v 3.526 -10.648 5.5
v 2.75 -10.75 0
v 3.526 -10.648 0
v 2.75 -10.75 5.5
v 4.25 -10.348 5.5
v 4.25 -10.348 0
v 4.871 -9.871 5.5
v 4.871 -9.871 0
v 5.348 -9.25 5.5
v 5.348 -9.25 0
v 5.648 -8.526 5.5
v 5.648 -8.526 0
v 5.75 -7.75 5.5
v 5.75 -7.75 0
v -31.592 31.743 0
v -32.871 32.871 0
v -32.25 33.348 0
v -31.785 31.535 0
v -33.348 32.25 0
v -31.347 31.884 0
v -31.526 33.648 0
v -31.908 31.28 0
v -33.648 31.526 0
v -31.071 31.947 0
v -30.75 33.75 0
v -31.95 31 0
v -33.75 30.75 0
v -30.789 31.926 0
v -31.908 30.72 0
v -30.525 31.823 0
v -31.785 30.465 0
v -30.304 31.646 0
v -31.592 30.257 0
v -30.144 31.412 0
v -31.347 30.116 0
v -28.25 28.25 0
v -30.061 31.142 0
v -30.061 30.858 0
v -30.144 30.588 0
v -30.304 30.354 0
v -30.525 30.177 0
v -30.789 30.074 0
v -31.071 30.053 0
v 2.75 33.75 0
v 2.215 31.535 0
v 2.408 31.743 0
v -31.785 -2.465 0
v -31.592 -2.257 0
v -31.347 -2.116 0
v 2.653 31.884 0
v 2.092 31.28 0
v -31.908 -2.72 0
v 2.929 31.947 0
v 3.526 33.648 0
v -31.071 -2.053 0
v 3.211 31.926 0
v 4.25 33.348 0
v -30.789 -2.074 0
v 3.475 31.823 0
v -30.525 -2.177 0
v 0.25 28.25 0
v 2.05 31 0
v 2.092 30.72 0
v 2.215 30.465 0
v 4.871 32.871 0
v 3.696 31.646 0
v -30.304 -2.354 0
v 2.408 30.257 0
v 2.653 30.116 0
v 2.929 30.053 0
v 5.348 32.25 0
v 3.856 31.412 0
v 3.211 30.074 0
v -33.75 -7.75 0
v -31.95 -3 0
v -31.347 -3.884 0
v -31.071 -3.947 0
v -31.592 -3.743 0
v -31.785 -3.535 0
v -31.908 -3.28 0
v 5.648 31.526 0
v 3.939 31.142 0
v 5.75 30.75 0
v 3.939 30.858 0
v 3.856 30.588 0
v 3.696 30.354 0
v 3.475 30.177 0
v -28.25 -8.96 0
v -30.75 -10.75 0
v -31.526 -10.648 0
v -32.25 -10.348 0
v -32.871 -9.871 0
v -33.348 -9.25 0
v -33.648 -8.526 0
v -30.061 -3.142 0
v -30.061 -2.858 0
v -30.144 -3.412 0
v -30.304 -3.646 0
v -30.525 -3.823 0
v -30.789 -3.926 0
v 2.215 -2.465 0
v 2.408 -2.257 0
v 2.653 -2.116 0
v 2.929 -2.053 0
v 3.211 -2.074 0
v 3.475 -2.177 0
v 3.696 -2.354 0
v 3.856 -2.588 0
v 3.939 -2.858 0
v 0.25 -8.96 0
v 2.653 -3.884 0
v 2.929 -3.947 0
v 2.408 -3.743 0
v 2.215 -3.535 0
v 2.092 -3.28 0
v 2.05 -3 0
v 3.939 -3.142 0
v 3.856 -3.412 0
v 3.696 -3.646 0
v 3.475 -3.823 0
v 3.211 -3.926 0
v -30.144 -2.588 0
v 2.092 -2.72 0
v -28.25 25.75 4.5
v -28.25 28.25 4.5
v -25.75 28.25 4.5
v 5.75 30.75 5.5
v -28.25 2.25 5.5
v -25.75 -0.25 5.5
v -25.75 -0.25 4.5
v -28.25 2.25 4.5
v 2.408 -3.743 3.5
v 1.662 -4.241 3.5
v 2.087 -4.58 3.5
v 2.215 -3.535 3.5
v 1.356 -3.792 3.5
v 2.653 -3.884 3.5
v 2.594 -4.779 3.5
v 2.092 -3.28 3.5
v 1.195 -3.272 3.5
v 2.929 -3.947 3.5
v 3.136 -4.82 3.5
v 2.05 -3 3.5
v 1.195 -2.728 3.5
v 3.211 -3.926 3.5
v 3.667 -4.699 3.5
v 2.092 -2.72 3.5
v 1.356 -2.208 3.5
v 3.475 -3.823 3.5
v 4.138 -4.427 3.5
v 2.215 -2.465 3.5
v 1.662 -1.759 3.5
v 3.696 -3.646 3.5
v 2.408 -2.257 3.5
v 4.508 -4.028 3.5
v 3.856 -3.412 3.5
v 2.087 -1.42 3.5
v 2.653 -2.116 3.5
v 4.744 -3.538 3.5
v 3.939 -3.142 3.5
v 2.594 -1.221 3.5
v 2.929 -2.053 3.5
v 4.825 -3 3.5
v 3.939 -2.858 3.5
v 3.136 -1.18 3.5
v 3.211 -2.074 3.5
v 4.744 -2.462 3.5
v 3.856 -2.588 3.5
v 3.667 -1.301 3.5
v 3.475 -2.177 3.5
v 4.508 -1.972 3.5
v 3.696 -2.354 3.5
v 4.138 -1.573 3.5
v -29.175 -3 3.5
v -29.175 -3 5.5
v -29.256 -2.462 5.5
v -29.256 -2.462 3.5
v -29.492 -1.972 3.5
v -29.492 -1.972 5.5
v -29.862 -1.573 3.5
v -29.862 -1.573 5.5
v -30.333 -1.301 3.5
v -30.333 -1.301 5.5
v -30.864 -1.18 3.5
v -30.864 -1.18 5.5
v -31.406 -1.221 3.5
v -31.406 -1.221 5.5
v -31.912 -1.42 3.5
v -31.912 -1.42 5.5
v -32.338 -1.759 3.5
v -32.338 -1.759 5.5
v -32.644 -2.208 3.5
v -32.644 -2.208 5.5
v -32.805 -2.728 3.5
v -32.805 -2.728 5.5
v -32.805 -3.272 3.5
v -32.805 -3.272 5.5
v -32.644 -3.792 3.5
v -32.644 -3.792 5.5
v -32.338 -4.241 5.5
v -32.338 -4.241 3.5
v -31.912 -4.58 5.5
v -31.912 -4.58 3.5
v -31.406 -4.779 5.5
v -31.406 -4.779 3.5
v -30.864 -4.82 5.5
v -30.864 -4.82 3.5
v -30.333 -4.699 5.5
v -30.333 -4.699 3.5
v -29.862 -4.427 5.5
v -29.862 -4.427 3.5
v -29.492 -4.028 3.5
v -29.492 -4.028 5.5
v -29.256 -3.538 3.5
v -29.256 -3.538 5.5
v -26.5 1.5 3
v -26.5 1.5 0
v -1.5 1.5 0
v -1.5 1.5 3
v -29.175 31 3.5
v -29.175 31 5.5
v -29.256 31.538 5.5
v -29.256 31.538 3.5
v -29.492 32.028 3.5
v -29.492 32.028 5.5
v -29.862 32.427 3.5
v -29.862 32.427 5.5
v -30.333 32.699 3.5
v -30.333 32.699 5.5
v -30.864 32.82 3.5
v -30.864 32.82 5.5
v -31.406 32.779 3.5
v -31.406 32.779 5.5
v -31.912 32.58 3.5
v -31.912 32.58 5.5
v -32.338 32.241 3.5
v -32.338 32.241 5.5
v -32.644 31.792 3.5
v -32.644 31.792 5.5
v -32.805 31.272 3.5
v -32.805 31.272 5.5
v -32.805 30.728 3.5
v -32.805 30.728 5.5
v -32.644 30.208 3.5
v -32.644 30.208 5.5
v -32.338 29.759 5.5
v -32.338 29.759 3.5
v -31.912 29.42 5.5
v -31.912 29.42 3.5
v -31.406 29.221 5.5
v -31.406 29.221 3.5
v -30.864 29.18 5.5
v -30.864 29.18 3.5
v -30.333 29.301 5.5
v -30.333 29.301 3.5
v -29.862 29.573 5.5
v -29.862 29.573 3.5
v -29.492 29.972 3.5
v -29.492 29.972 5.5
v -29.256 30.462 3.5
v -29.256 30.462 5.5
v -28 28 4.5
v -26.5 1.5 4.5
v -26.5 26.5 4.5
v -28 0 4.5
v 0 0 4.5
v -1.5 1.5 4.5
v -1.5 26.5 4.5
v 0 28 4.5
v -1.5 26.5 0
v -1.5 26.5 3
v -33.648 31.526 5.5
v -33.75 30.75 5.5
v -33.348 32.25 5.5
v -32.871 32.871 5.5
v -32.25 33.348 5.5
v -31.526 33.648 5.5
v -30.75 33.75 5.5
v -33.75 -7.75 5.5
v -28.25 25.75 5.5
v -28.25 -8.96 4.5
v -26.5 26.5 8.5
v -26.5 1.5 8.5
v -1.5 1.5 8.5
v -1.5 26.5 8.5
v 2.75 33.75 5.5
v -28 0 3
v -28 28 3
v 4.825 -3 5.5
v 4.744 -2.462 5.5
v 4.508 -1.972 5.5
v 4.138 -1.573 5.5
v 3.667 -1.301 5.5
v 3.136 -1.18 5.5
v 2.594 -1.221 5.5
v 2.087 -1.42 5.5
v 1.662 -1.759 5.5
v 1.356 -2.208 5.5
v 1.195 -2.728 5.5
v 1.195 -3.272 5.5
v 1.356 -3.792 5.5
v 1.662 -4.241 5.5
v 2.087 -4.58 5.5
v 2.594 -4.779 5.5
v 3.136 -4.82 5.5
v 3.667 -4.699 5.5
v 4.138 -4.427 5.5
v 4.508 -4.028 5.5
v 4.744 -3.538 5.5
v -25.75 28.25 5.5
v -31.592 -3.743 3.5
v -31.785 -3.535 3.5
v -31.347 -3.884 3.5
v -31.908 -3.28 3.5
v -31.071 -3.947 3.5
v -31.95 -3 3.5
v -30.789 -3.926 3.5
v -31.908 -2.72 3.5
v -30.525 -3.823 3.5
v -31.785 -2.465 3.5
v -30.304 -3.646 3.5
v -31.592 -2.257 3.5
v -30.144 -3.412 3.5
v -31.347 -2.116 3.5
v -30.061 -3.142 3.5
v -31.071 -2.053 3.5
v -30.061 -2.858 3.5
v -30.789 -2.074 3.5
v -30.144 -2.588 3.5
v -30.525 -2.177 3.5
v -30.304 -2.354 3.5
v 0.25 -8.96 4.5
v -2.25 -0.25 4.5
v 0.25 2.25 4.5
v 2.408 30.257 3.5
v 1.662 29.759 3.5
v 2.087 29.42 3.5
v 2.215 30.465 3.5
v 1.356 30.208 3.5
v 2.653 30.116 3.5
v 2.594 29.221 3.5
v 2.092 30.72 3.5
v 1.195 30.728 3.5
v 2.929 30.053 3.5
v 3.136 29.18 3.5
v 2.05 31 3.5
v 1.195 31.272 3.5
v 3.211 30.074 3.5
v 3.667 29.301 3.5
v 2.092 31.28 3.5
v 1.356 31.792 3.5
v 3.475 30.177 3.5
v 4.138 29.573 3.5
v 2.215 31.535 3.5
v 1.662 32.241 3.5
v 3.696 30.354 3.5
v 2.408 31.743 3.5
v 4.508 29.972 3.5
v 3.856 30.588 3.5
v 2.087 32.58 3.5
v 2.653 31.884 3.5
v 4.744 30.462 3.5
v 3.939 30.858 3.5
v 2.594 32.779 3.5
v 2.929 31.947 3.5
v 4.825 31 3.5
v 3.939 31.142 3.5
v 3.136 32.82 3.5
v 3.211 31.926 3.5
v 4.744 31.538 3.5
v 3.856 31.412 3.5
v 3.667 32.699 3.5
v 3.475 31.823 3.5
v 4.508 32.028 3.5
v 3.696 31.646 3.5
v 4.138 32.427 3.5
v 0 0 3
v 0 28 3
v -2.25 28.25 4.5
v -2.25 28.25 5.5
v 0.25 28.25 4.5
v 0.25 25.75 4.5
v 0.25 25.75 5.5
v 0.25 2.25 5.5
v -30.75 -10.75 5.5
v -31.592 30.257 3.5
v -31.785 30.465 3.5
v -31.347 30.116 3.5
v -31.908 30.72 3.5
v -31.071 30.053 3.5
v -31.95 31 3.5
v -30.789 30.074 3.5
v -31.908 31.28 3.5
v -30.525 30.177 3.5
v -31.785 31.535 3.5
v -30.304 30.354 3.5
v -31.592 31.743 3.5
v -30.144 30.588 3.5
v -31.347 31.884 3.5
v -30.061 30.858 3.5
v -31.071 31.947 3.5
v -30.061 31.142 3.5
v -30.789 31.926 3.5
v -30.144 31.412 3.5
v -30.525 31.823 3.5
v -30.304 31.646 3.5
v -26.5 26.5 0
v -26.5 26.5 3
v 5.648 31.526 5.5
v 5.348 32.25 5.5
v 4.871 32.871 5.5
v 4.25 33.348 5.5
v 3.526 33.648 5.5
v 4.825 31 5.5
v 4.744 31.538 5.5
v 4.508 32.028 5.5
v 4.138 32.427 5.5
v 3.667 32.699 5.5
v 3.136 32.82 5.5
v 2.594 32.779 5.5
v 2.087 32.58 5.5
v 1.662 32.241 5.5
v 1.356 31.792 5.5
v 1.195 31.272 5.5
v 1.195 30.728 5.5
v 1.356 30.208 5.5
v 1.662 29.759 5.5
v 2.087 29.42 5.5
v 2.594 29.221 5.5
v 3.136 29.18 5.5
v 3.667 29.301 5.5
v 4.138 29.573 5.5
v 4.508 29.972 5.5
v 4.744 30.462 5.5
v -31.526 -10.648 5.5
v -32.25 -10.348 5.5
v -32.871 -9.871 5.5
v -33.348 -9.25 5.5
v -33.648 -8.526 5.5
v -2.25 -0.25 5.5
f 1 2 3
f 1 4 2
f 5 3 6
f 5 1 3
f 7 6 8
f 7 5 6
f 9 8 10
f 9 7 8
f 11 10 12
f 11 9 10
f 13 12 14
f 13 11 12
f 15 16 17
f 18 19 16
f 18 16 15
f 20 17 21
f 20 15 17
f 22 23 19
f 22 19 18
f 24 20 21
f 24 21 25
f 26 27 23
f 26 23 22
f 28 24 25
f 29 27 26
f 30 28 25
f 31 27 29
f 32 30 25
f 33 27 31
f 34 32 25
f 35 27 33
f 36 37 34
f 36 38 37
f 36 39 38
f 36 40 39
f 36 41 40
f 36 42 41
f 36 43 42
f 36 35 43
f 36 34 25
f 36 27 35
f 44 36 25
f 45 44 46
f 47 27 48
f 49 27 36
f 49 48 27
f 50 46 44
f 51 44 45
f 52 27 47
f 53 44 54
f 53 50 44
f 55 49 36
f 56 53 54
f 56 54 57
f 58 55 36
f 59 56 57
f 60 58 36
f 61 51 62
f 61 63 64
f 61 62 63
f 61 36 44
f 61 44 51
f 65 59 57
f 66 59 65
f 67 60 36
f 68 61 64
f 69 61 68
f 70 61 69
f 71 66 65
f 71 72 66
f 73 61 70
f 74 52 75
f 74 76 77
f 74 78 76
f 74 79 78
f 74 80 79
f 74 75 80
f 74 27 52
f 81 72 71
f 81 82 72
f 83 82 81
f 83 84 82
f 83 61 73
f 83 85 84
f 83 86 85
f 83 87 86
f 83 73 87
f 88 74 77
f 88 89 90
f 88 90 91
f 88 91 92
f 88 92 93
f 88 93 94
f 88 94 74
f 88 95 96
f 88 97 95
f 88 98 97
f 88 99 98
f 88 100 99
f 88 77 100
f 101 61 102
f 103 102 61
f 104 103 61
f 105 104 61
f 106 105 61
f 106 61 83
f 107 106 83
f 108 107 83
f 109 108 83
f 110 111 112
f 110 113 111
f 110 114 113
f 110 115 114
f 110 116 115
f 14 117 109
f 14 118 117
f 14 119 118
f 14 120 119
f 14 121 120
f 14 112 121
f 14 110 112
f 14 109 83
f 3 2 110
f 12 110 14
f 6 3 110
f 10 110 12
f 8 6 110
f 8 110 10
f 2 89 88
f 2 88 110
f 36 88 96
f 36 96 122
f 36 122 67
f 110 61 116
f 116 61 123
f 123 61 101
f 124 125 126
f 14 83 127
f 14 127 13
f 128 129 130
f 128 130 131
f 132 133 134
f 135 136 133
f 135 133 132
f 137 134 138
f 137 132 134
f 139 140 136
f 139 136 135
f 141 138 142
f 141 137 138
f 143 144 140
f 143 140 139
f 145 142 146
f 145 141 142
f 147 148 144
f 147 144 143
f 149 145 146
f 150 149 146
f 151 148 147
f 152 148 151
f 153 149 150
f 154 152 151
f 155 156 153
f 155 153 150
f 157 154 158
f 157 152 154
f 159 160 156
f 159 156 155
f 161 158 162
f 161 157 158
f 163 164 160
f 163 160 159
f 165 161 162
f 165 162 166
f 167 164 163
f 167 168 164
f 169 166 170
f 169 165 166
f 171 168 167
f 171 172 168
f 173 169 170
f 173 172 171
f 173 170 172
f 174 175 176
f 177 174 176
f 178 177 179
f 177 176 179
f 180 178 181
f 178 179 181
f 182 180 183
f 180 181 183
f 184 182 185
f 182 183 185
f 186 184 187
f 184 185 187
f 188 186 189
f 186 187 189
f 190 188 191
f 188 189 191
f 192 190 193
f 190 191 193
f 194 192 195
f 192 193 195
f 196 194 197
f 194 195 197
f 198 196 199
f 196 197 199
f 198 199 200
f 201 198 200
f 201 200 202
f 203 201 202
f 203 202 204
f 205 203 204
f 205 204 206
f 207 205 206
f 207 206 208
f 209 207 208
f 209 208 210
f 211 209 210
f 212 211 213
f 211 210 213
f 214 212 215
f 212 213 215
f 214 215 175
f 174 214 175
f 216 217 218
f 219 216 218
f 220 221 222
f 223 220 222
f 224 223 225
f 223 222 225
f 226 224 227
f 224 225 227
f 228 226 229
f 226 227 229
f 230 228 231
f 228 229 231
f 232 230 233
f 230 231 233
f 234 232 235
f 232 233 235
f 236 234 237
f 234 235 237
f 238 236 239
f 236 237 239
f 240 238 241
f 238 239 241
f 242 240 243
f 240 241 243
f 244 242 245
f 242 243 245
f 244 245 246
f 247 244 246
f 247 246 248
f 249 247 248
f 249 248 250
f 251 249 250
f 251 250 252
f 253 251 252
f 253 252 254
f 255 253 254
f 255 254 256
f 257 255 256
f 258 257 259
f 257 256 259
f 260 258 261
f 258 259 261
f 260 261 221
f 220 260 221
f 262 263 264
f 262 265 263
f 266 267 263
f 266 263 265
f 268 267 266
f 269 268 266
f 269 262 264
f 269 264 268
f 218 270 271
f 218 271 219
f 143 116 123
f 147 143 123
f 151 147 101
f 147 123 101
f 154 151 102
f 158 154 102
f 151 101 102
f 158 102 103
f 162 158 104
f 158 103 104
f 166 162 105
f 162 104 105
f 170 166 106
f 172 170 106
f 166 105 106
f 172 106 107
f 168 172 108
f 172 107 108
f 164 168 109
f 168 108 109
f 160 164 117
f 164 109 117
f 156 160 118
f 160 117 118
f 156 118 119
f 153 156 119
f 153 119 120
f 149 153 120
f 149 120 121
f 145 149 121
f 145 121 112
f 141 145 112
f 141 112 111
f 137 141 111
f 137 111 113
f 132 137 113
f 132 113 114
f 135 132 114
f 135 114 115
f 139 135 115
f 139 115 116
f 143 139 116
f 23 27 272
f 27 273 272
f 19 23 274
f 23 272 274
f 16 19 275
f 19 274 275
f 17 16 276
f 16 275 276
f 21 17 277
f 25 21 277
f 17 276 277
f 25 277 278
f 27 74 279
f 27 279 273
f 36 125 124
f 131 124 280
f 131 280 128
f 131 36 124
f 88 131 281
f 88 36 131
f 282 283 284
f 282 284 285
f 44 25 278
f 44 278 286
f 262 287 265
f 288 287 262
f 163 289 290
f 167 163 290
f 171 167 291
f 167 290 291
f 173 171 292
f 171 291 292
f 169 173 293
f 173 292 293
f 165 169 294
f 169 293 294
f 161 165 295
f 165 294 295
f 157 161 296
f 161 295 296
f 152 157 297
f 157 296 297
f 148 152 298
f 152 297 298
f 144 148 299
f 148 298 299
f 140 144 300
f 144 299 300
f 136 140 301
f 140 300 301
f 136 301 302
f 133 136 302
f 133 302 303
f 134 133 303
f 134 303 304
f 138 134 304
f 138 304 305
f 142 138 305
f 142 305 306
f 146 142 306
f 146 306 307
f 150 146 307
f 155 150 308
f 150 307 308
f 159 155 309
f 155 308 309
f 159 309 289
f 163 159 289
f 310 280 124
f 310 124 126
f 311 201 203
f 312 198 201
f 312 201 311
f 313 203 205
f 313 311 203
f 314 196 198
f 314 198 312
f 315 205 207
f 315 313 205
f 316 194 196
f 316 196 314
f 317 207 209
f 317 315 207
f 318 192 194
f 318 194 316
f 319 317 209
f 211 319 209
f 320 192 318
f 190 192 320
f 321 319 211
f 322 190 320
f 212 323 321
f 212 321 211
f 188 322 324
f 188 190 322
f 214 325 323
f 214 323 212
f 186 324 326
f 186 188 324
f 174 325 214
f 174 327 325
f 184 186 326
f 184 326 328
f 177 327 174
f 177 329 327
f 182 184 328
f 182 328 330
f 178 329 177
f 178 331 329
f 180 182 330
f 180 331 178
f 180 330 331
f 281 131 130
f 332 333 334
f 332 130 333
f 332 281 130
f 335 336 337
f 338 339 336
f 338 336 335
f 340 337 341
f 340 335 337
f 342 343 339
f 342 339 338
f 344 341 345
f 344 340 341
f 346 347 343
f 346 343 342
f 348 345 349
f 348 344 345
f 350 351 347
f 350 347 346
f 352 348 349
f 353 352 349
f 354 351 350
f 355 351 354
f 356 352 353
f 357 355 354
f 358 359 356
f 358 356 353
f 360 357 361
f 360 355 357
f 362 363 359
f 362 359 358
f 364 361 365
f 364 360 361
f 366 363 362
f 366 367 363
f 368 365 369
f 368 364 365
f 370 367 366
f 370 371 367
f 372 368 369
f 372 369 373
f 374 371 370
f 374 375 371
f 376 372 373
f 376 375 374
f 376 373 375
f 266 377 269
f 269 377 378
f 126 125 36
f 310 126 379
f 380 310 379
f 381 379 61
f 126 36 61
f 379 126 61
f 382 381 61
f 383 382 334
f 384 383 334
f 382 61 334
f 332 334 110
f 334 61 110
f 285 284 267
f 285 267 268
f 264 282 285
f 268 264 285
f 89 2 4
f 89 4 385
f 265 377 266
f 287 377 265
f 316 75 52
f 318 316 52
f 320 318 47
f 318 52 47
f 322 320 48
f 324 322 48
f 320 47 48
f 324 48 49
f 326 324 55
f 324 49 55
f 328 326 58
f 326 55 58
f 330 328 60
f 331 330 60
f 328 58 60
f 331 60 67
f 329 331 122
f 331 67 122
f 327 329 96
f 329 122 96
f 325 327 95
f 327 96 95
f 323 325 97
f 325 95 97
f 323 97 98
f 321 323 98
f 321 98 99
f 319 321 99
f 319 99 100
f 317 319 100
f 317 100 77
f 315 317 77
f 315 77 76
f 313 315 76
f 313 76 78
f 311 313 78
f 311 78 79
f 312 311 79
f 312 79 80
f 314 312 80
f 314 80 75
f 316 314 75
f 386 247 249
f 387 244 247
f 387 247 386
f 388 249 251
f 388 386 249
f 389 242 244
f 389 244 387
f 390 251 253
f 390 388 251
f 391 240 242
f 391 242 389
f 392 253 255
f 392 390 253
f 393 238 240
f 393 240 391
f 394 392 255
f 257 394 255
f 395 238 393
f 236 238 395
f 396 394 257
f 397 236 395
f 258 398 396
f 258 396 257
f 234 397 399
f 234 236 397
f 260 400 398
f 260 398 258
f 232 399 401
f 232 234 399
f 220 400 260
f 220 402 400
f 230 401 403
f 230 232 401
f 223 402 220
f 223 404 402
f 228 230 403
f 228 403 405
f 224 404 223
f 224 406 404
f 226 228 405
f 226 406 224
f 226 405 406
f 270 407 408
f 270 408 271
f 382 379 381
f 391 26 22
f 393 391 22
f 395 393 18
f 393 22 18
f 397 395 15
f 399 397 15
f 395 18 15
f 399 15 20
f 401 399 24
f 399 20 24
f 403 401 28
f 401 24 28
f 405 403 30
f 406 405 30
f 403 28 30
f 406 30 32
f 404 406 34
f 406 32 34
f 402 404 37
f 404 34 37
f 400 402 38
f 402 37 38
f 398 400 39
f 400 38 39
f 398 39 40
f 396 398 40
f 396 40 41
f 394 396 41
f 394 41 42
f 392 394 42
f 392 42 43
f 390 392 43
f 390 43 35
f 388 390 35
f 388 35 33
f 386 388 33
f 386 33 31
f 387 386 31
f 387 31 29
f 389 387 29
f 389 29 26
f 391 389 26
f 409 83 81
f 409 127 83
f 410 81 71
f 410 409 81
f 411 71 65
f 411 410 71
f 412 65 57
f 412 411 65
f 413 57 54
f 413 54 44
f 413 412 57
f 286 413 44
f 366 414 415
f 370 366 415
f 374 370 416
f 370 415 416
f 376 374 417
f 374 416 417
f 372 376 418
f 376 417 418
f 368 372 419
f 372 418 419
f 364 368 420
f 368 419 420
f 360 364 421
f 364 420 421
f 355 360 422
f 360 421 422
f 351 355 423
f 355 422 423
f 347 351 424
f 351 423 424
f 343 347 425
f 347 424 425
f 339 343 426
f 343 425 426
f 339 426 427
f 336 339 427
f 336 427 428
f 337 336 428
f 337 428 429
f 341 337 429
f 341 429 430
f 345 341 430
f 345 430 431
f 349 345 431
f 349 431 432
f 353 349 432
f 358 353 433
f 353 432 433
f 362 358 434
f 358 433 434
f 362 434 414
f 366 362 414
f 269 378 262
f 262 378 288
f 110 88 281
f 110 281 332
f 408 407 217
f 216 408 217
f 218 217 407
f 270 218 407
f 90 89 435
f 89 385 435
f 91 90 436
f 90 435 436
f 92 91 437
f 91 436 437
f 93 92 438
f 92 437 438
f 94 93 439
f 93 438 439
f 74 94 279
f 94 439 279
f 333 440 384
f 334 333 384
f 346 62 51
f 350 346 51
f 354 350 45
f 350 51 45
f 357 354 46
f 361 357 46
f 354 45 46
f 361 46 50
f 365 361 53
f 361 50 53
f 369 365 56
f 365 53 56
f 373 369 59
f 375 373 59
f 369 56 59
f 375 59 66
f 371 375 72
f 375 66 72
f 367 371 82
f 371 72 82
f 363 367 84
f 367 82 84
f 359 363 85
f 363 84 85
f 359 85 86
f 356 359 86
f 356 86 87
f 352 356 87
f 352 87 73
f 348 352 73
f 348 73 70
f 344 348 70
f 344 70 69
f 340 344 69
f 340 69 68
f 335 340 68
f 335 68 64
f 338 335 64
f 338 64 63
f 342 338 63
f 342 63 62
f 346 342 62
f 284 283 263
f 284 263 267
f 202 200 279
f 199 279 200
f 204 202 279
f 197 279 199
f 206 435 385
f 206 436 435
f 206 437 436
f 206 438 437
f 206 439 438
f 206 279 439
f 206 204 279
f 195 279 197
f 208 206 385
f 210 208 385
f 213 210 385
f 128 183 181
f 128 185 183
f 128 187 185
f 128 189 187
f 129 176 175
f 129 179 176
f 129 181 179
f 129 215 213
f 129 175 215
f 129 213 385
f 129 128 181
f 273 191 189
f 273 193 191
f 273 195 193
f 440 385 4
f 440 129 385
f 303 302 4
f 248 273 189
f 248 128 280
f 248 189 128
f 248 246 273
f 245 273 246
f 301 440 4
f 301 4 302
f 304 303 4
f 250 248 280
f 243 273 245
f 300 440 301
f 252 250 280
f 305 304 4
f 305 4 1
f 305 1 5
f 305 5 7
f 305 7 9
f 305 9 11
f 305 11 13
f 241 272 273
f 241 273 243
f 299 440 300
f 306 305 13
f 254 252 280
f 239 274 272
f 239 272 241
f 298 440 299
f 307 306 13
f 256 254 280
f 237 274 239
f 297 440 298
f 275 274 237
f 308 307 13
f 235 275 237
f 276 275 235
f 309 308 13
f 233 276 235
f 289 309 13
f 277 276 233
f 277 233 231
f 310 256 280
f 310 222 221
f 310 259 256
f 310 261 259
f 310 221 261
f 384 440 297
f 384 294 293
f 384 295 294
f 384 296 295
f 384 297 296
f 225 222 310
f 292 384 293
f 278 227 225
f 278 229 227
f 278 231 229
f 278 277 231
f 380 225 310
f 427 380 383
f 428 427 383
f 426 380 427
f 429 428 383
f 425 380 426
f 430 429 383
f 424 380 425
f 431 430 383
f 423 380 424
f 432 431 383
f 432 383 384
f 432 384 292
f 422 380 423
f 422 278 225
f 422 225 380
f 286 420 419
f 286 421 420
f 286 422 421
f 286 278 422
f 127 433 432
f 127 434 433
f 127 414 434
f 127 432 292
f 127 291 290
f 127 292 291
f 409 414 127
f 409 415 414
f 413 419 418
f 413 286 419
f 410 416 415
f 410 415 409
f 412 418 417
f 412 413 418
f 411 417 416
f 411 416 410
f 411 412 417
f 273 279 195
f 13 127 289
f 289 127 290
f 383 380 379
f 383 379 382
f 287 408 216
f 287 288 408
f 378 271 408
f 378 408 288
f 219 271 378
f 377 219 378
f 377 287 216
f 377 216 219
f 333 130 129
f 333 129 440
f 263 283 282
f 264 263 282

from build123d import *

# Parameters (mm, degrees)
SKETCH1_W           = 28
SKETCH1_H           = 28
BOSS_EXTRUDE1_DEPTH = 8.5
SKETCH4_W           = 28.5
SKETCH4_H           = 28.5
BOSS_EXTRUDE2_DEPTH = 5.5
BOSS_EXTRUDE3_DEPTH = 0.75
SKETCH6_W           = 28
SKETCH6_H           = 28
SKETCH6_W_2         = 25
SKETCH6_H_2         = 25
CUT_EXTRUDE4_DEPTH  = 3
SKETCH7_W           = 28
SKETCH7_H           = 28
SKETCH7_W_2         = 25
SKETCH7_H_2         = 25
CUT_EXTRUDE5_DEPTH  = 4
SKETCH9_R           = 0.95
CUT_EXTRUDE7_DEPTH  = 5.5
SKETCH13_R          = 1.825
CUT_EXTRUDE8_DEPTH  = 2
SKETCH14_W          = 28.5
SKETCH14_H          = 8.710343244
CUT_EXTRUDE9_DEPTH  = 4.5
FILLET2_R           = 3
BOSS_EXTRUDE4_DEPTH = 0.25


with BuildPart() as part:
    # Sketch1 → Boss-Extrude1 (new body)
    with BuildSketch(Plane(origin=(0, 0, 0), x_dir=(0, 1, 0), z_dir=(0, 0, 1))):
        with Locations((14, 14)):
            Rectangle(SKETCH1_W, SKETCH1_H)
    extrude(amount=BOSS_EXTRUDE1_DEPTH)

    # Sketch6 → Cut-Extrude4 (cut)
    with BuildSketch(Plane(origin=(0, 0, 0), x_dir=(1, 0, 0), z_dir=(0, 0, -1))):
        with Locations((-14, -14)):
            Rectangle(SKETCH6_W, SKETCH6_H)
        with Locations((-14, -14)):
            Rectangle(SKETCH6_W_2, SKETCH6_H_2, mode=Mode.SUBTRACT)
    extrude(amount=-CUT_EXTRUDE4_DEPTH, mode=Mode.SUBTRACT)

    # Sketch7 → Cut-Extrude5 (cut)
    with BuildSketch(Plane.XY.offset(8.5)):
        with Locations((-14, 14)):
            Rectangle(SKETCH7_W, SKETCH7_H)
        with Locations((-14, 14)):
            Rectangle(SKETCH7_W_2, SKETCH7_H_2, mode=Mode.SUBTRACT)
    extrude(amount=-CUT_EXTRUDE5_DEPTH, mode=Mode.SUBTRACT)


with BuildPart() as body_2:
    # Sketch4 → Boss-Extrude2 (new body)
    with BuildSketch(Plane(origin=(0, 0, 0), x_dir=(1, 0, 0), z_dir=(0, 0, -1))):
        Polygon((-33.75, 5.75), (-33.75, -33.75), (5.75, -33.75), (5.75, 5.75), (5.75, 10.75), (-33.75, 10.75), align=None)
        with Locations((-14, -14)):
            Rectangle(SKETCH4_W, SKETCH4_H, mode=Mode.SUBTRACT)
    extrude(amount=-BOSS_EXTRUDE2_DEPTH)

    # Sketch5 → Boss-Extrude3 (add)
    with BuildSketch(Plane.XY.offset(5.5)):
        Polygon((-28.25, 25.75), (-25.75, 28.25), (-28.25, 28.25), align=None)
        Polygon((-2.25, 28.25), (0.25, 25.75), (0.25, 28.25), align=None)
        Polygon((-2.25, -0.25), (0.25, 2.25), (0.25, -0.25), align=None)
        Polygon((-25.75, -0.25), (-28.25, 2.25), (-28.25, -0.25), align=None)
    extrude(amount=-BOSS_EXTRUDE3_DEPTH)

    # Sketch9 → Cut-Extrude7 (cut)
    with BuildSketch(Plane(origin=(0, 0, 0), x_dir=(1, 0, 0), z_dir=(0, 0, -1))):
        with Locations(Location((-31, 3, 0), (0, 0, 180))):
            Circle(SKETCH9_R)
        with Locations(Location((3, 3, 0), (0, 0, 180))):
            Circle(SKETCH9_R)
        with Locations(Location((3, -31, 0), (0, 0, 180))):
            Circle(SKETCH9_R)
        with Locations(Location((-31, -31, 0), (0, 0, 180))):
            Circle(SKETCH9_R)
    extrude(amount=-CUT_EXTRUDE7_DEPTH, mode=Mode.SUBTRACT)

    # Sketch13 → Cut-Extrude8 (cut)
    with BuildSketch(Plane.XY.offset(5.5)):
        with Locations((-31, 31)):
            Circle(SKETCH13_R)
        with Locations((3, 31)):
            Circle(SKETCH13_R)
        with Locations((3, -3)):
            Circle(SKETCH13_R)
        with Locations((-31, -3)):
            Circle(SKETCH13_R)
    extrude(amount=-CUT_EXTRUDE8_DEPTH, mode=Mode.SUBTRACT)

    # Sketch14 → Cut-Extrude9 (cut)
    with BuildSketch(Plane(origin=(0, 0, 0), x_dir=(1, 0, 0), z_dir=(0, 0, -1))):
        with Locations((-14, 4.605171622)):
            Rectangle(SKETCH14_W, SKETCH14_H)
    extrude(amount=-CUT_EXTRUDE9_DEPTH, mode=Mode.SUBTRACT)

    # Fillet2
    fillet2_edges = [body_2.edges().sort_by_distance(p)[0] for p in [
        (5.75, 33.75, 2.75),
        (-33.75, 33.75, 2.75),
        (-33.75, -10.75, 2.75),
        (5.75, -10.75, 2.75),
    ]]
    fillet(fillet2_edges, radius=FILLET2_R)

    # Sketch15 → Boss-Extrude4 (add)
    with BuildSketch(Plane(origin=(0, 0, 4.75), x_dir=(1, 0, 0), z_dir=(0, 0, -1))):
        Polygon((0.25, 0.25), (-2.25, 0.25), (0.25, -2.25), align=None)
        Polygon((-28.25, 0.25), (-28.25, -2.25), (-25.75, 0.25), align=None)
        Polygon((-28.25, -28.25), (-25.75, -28.25), (-28.25, -25.75), align=None)
        Polygon((0.25, -28.25), (0.25, -25.75), (-2.25, -28.25), align=None)
    extrude(amount=BOSS_EXTRUDE4_DEPTH)


solid = Compound([part.part, body_2.part])
